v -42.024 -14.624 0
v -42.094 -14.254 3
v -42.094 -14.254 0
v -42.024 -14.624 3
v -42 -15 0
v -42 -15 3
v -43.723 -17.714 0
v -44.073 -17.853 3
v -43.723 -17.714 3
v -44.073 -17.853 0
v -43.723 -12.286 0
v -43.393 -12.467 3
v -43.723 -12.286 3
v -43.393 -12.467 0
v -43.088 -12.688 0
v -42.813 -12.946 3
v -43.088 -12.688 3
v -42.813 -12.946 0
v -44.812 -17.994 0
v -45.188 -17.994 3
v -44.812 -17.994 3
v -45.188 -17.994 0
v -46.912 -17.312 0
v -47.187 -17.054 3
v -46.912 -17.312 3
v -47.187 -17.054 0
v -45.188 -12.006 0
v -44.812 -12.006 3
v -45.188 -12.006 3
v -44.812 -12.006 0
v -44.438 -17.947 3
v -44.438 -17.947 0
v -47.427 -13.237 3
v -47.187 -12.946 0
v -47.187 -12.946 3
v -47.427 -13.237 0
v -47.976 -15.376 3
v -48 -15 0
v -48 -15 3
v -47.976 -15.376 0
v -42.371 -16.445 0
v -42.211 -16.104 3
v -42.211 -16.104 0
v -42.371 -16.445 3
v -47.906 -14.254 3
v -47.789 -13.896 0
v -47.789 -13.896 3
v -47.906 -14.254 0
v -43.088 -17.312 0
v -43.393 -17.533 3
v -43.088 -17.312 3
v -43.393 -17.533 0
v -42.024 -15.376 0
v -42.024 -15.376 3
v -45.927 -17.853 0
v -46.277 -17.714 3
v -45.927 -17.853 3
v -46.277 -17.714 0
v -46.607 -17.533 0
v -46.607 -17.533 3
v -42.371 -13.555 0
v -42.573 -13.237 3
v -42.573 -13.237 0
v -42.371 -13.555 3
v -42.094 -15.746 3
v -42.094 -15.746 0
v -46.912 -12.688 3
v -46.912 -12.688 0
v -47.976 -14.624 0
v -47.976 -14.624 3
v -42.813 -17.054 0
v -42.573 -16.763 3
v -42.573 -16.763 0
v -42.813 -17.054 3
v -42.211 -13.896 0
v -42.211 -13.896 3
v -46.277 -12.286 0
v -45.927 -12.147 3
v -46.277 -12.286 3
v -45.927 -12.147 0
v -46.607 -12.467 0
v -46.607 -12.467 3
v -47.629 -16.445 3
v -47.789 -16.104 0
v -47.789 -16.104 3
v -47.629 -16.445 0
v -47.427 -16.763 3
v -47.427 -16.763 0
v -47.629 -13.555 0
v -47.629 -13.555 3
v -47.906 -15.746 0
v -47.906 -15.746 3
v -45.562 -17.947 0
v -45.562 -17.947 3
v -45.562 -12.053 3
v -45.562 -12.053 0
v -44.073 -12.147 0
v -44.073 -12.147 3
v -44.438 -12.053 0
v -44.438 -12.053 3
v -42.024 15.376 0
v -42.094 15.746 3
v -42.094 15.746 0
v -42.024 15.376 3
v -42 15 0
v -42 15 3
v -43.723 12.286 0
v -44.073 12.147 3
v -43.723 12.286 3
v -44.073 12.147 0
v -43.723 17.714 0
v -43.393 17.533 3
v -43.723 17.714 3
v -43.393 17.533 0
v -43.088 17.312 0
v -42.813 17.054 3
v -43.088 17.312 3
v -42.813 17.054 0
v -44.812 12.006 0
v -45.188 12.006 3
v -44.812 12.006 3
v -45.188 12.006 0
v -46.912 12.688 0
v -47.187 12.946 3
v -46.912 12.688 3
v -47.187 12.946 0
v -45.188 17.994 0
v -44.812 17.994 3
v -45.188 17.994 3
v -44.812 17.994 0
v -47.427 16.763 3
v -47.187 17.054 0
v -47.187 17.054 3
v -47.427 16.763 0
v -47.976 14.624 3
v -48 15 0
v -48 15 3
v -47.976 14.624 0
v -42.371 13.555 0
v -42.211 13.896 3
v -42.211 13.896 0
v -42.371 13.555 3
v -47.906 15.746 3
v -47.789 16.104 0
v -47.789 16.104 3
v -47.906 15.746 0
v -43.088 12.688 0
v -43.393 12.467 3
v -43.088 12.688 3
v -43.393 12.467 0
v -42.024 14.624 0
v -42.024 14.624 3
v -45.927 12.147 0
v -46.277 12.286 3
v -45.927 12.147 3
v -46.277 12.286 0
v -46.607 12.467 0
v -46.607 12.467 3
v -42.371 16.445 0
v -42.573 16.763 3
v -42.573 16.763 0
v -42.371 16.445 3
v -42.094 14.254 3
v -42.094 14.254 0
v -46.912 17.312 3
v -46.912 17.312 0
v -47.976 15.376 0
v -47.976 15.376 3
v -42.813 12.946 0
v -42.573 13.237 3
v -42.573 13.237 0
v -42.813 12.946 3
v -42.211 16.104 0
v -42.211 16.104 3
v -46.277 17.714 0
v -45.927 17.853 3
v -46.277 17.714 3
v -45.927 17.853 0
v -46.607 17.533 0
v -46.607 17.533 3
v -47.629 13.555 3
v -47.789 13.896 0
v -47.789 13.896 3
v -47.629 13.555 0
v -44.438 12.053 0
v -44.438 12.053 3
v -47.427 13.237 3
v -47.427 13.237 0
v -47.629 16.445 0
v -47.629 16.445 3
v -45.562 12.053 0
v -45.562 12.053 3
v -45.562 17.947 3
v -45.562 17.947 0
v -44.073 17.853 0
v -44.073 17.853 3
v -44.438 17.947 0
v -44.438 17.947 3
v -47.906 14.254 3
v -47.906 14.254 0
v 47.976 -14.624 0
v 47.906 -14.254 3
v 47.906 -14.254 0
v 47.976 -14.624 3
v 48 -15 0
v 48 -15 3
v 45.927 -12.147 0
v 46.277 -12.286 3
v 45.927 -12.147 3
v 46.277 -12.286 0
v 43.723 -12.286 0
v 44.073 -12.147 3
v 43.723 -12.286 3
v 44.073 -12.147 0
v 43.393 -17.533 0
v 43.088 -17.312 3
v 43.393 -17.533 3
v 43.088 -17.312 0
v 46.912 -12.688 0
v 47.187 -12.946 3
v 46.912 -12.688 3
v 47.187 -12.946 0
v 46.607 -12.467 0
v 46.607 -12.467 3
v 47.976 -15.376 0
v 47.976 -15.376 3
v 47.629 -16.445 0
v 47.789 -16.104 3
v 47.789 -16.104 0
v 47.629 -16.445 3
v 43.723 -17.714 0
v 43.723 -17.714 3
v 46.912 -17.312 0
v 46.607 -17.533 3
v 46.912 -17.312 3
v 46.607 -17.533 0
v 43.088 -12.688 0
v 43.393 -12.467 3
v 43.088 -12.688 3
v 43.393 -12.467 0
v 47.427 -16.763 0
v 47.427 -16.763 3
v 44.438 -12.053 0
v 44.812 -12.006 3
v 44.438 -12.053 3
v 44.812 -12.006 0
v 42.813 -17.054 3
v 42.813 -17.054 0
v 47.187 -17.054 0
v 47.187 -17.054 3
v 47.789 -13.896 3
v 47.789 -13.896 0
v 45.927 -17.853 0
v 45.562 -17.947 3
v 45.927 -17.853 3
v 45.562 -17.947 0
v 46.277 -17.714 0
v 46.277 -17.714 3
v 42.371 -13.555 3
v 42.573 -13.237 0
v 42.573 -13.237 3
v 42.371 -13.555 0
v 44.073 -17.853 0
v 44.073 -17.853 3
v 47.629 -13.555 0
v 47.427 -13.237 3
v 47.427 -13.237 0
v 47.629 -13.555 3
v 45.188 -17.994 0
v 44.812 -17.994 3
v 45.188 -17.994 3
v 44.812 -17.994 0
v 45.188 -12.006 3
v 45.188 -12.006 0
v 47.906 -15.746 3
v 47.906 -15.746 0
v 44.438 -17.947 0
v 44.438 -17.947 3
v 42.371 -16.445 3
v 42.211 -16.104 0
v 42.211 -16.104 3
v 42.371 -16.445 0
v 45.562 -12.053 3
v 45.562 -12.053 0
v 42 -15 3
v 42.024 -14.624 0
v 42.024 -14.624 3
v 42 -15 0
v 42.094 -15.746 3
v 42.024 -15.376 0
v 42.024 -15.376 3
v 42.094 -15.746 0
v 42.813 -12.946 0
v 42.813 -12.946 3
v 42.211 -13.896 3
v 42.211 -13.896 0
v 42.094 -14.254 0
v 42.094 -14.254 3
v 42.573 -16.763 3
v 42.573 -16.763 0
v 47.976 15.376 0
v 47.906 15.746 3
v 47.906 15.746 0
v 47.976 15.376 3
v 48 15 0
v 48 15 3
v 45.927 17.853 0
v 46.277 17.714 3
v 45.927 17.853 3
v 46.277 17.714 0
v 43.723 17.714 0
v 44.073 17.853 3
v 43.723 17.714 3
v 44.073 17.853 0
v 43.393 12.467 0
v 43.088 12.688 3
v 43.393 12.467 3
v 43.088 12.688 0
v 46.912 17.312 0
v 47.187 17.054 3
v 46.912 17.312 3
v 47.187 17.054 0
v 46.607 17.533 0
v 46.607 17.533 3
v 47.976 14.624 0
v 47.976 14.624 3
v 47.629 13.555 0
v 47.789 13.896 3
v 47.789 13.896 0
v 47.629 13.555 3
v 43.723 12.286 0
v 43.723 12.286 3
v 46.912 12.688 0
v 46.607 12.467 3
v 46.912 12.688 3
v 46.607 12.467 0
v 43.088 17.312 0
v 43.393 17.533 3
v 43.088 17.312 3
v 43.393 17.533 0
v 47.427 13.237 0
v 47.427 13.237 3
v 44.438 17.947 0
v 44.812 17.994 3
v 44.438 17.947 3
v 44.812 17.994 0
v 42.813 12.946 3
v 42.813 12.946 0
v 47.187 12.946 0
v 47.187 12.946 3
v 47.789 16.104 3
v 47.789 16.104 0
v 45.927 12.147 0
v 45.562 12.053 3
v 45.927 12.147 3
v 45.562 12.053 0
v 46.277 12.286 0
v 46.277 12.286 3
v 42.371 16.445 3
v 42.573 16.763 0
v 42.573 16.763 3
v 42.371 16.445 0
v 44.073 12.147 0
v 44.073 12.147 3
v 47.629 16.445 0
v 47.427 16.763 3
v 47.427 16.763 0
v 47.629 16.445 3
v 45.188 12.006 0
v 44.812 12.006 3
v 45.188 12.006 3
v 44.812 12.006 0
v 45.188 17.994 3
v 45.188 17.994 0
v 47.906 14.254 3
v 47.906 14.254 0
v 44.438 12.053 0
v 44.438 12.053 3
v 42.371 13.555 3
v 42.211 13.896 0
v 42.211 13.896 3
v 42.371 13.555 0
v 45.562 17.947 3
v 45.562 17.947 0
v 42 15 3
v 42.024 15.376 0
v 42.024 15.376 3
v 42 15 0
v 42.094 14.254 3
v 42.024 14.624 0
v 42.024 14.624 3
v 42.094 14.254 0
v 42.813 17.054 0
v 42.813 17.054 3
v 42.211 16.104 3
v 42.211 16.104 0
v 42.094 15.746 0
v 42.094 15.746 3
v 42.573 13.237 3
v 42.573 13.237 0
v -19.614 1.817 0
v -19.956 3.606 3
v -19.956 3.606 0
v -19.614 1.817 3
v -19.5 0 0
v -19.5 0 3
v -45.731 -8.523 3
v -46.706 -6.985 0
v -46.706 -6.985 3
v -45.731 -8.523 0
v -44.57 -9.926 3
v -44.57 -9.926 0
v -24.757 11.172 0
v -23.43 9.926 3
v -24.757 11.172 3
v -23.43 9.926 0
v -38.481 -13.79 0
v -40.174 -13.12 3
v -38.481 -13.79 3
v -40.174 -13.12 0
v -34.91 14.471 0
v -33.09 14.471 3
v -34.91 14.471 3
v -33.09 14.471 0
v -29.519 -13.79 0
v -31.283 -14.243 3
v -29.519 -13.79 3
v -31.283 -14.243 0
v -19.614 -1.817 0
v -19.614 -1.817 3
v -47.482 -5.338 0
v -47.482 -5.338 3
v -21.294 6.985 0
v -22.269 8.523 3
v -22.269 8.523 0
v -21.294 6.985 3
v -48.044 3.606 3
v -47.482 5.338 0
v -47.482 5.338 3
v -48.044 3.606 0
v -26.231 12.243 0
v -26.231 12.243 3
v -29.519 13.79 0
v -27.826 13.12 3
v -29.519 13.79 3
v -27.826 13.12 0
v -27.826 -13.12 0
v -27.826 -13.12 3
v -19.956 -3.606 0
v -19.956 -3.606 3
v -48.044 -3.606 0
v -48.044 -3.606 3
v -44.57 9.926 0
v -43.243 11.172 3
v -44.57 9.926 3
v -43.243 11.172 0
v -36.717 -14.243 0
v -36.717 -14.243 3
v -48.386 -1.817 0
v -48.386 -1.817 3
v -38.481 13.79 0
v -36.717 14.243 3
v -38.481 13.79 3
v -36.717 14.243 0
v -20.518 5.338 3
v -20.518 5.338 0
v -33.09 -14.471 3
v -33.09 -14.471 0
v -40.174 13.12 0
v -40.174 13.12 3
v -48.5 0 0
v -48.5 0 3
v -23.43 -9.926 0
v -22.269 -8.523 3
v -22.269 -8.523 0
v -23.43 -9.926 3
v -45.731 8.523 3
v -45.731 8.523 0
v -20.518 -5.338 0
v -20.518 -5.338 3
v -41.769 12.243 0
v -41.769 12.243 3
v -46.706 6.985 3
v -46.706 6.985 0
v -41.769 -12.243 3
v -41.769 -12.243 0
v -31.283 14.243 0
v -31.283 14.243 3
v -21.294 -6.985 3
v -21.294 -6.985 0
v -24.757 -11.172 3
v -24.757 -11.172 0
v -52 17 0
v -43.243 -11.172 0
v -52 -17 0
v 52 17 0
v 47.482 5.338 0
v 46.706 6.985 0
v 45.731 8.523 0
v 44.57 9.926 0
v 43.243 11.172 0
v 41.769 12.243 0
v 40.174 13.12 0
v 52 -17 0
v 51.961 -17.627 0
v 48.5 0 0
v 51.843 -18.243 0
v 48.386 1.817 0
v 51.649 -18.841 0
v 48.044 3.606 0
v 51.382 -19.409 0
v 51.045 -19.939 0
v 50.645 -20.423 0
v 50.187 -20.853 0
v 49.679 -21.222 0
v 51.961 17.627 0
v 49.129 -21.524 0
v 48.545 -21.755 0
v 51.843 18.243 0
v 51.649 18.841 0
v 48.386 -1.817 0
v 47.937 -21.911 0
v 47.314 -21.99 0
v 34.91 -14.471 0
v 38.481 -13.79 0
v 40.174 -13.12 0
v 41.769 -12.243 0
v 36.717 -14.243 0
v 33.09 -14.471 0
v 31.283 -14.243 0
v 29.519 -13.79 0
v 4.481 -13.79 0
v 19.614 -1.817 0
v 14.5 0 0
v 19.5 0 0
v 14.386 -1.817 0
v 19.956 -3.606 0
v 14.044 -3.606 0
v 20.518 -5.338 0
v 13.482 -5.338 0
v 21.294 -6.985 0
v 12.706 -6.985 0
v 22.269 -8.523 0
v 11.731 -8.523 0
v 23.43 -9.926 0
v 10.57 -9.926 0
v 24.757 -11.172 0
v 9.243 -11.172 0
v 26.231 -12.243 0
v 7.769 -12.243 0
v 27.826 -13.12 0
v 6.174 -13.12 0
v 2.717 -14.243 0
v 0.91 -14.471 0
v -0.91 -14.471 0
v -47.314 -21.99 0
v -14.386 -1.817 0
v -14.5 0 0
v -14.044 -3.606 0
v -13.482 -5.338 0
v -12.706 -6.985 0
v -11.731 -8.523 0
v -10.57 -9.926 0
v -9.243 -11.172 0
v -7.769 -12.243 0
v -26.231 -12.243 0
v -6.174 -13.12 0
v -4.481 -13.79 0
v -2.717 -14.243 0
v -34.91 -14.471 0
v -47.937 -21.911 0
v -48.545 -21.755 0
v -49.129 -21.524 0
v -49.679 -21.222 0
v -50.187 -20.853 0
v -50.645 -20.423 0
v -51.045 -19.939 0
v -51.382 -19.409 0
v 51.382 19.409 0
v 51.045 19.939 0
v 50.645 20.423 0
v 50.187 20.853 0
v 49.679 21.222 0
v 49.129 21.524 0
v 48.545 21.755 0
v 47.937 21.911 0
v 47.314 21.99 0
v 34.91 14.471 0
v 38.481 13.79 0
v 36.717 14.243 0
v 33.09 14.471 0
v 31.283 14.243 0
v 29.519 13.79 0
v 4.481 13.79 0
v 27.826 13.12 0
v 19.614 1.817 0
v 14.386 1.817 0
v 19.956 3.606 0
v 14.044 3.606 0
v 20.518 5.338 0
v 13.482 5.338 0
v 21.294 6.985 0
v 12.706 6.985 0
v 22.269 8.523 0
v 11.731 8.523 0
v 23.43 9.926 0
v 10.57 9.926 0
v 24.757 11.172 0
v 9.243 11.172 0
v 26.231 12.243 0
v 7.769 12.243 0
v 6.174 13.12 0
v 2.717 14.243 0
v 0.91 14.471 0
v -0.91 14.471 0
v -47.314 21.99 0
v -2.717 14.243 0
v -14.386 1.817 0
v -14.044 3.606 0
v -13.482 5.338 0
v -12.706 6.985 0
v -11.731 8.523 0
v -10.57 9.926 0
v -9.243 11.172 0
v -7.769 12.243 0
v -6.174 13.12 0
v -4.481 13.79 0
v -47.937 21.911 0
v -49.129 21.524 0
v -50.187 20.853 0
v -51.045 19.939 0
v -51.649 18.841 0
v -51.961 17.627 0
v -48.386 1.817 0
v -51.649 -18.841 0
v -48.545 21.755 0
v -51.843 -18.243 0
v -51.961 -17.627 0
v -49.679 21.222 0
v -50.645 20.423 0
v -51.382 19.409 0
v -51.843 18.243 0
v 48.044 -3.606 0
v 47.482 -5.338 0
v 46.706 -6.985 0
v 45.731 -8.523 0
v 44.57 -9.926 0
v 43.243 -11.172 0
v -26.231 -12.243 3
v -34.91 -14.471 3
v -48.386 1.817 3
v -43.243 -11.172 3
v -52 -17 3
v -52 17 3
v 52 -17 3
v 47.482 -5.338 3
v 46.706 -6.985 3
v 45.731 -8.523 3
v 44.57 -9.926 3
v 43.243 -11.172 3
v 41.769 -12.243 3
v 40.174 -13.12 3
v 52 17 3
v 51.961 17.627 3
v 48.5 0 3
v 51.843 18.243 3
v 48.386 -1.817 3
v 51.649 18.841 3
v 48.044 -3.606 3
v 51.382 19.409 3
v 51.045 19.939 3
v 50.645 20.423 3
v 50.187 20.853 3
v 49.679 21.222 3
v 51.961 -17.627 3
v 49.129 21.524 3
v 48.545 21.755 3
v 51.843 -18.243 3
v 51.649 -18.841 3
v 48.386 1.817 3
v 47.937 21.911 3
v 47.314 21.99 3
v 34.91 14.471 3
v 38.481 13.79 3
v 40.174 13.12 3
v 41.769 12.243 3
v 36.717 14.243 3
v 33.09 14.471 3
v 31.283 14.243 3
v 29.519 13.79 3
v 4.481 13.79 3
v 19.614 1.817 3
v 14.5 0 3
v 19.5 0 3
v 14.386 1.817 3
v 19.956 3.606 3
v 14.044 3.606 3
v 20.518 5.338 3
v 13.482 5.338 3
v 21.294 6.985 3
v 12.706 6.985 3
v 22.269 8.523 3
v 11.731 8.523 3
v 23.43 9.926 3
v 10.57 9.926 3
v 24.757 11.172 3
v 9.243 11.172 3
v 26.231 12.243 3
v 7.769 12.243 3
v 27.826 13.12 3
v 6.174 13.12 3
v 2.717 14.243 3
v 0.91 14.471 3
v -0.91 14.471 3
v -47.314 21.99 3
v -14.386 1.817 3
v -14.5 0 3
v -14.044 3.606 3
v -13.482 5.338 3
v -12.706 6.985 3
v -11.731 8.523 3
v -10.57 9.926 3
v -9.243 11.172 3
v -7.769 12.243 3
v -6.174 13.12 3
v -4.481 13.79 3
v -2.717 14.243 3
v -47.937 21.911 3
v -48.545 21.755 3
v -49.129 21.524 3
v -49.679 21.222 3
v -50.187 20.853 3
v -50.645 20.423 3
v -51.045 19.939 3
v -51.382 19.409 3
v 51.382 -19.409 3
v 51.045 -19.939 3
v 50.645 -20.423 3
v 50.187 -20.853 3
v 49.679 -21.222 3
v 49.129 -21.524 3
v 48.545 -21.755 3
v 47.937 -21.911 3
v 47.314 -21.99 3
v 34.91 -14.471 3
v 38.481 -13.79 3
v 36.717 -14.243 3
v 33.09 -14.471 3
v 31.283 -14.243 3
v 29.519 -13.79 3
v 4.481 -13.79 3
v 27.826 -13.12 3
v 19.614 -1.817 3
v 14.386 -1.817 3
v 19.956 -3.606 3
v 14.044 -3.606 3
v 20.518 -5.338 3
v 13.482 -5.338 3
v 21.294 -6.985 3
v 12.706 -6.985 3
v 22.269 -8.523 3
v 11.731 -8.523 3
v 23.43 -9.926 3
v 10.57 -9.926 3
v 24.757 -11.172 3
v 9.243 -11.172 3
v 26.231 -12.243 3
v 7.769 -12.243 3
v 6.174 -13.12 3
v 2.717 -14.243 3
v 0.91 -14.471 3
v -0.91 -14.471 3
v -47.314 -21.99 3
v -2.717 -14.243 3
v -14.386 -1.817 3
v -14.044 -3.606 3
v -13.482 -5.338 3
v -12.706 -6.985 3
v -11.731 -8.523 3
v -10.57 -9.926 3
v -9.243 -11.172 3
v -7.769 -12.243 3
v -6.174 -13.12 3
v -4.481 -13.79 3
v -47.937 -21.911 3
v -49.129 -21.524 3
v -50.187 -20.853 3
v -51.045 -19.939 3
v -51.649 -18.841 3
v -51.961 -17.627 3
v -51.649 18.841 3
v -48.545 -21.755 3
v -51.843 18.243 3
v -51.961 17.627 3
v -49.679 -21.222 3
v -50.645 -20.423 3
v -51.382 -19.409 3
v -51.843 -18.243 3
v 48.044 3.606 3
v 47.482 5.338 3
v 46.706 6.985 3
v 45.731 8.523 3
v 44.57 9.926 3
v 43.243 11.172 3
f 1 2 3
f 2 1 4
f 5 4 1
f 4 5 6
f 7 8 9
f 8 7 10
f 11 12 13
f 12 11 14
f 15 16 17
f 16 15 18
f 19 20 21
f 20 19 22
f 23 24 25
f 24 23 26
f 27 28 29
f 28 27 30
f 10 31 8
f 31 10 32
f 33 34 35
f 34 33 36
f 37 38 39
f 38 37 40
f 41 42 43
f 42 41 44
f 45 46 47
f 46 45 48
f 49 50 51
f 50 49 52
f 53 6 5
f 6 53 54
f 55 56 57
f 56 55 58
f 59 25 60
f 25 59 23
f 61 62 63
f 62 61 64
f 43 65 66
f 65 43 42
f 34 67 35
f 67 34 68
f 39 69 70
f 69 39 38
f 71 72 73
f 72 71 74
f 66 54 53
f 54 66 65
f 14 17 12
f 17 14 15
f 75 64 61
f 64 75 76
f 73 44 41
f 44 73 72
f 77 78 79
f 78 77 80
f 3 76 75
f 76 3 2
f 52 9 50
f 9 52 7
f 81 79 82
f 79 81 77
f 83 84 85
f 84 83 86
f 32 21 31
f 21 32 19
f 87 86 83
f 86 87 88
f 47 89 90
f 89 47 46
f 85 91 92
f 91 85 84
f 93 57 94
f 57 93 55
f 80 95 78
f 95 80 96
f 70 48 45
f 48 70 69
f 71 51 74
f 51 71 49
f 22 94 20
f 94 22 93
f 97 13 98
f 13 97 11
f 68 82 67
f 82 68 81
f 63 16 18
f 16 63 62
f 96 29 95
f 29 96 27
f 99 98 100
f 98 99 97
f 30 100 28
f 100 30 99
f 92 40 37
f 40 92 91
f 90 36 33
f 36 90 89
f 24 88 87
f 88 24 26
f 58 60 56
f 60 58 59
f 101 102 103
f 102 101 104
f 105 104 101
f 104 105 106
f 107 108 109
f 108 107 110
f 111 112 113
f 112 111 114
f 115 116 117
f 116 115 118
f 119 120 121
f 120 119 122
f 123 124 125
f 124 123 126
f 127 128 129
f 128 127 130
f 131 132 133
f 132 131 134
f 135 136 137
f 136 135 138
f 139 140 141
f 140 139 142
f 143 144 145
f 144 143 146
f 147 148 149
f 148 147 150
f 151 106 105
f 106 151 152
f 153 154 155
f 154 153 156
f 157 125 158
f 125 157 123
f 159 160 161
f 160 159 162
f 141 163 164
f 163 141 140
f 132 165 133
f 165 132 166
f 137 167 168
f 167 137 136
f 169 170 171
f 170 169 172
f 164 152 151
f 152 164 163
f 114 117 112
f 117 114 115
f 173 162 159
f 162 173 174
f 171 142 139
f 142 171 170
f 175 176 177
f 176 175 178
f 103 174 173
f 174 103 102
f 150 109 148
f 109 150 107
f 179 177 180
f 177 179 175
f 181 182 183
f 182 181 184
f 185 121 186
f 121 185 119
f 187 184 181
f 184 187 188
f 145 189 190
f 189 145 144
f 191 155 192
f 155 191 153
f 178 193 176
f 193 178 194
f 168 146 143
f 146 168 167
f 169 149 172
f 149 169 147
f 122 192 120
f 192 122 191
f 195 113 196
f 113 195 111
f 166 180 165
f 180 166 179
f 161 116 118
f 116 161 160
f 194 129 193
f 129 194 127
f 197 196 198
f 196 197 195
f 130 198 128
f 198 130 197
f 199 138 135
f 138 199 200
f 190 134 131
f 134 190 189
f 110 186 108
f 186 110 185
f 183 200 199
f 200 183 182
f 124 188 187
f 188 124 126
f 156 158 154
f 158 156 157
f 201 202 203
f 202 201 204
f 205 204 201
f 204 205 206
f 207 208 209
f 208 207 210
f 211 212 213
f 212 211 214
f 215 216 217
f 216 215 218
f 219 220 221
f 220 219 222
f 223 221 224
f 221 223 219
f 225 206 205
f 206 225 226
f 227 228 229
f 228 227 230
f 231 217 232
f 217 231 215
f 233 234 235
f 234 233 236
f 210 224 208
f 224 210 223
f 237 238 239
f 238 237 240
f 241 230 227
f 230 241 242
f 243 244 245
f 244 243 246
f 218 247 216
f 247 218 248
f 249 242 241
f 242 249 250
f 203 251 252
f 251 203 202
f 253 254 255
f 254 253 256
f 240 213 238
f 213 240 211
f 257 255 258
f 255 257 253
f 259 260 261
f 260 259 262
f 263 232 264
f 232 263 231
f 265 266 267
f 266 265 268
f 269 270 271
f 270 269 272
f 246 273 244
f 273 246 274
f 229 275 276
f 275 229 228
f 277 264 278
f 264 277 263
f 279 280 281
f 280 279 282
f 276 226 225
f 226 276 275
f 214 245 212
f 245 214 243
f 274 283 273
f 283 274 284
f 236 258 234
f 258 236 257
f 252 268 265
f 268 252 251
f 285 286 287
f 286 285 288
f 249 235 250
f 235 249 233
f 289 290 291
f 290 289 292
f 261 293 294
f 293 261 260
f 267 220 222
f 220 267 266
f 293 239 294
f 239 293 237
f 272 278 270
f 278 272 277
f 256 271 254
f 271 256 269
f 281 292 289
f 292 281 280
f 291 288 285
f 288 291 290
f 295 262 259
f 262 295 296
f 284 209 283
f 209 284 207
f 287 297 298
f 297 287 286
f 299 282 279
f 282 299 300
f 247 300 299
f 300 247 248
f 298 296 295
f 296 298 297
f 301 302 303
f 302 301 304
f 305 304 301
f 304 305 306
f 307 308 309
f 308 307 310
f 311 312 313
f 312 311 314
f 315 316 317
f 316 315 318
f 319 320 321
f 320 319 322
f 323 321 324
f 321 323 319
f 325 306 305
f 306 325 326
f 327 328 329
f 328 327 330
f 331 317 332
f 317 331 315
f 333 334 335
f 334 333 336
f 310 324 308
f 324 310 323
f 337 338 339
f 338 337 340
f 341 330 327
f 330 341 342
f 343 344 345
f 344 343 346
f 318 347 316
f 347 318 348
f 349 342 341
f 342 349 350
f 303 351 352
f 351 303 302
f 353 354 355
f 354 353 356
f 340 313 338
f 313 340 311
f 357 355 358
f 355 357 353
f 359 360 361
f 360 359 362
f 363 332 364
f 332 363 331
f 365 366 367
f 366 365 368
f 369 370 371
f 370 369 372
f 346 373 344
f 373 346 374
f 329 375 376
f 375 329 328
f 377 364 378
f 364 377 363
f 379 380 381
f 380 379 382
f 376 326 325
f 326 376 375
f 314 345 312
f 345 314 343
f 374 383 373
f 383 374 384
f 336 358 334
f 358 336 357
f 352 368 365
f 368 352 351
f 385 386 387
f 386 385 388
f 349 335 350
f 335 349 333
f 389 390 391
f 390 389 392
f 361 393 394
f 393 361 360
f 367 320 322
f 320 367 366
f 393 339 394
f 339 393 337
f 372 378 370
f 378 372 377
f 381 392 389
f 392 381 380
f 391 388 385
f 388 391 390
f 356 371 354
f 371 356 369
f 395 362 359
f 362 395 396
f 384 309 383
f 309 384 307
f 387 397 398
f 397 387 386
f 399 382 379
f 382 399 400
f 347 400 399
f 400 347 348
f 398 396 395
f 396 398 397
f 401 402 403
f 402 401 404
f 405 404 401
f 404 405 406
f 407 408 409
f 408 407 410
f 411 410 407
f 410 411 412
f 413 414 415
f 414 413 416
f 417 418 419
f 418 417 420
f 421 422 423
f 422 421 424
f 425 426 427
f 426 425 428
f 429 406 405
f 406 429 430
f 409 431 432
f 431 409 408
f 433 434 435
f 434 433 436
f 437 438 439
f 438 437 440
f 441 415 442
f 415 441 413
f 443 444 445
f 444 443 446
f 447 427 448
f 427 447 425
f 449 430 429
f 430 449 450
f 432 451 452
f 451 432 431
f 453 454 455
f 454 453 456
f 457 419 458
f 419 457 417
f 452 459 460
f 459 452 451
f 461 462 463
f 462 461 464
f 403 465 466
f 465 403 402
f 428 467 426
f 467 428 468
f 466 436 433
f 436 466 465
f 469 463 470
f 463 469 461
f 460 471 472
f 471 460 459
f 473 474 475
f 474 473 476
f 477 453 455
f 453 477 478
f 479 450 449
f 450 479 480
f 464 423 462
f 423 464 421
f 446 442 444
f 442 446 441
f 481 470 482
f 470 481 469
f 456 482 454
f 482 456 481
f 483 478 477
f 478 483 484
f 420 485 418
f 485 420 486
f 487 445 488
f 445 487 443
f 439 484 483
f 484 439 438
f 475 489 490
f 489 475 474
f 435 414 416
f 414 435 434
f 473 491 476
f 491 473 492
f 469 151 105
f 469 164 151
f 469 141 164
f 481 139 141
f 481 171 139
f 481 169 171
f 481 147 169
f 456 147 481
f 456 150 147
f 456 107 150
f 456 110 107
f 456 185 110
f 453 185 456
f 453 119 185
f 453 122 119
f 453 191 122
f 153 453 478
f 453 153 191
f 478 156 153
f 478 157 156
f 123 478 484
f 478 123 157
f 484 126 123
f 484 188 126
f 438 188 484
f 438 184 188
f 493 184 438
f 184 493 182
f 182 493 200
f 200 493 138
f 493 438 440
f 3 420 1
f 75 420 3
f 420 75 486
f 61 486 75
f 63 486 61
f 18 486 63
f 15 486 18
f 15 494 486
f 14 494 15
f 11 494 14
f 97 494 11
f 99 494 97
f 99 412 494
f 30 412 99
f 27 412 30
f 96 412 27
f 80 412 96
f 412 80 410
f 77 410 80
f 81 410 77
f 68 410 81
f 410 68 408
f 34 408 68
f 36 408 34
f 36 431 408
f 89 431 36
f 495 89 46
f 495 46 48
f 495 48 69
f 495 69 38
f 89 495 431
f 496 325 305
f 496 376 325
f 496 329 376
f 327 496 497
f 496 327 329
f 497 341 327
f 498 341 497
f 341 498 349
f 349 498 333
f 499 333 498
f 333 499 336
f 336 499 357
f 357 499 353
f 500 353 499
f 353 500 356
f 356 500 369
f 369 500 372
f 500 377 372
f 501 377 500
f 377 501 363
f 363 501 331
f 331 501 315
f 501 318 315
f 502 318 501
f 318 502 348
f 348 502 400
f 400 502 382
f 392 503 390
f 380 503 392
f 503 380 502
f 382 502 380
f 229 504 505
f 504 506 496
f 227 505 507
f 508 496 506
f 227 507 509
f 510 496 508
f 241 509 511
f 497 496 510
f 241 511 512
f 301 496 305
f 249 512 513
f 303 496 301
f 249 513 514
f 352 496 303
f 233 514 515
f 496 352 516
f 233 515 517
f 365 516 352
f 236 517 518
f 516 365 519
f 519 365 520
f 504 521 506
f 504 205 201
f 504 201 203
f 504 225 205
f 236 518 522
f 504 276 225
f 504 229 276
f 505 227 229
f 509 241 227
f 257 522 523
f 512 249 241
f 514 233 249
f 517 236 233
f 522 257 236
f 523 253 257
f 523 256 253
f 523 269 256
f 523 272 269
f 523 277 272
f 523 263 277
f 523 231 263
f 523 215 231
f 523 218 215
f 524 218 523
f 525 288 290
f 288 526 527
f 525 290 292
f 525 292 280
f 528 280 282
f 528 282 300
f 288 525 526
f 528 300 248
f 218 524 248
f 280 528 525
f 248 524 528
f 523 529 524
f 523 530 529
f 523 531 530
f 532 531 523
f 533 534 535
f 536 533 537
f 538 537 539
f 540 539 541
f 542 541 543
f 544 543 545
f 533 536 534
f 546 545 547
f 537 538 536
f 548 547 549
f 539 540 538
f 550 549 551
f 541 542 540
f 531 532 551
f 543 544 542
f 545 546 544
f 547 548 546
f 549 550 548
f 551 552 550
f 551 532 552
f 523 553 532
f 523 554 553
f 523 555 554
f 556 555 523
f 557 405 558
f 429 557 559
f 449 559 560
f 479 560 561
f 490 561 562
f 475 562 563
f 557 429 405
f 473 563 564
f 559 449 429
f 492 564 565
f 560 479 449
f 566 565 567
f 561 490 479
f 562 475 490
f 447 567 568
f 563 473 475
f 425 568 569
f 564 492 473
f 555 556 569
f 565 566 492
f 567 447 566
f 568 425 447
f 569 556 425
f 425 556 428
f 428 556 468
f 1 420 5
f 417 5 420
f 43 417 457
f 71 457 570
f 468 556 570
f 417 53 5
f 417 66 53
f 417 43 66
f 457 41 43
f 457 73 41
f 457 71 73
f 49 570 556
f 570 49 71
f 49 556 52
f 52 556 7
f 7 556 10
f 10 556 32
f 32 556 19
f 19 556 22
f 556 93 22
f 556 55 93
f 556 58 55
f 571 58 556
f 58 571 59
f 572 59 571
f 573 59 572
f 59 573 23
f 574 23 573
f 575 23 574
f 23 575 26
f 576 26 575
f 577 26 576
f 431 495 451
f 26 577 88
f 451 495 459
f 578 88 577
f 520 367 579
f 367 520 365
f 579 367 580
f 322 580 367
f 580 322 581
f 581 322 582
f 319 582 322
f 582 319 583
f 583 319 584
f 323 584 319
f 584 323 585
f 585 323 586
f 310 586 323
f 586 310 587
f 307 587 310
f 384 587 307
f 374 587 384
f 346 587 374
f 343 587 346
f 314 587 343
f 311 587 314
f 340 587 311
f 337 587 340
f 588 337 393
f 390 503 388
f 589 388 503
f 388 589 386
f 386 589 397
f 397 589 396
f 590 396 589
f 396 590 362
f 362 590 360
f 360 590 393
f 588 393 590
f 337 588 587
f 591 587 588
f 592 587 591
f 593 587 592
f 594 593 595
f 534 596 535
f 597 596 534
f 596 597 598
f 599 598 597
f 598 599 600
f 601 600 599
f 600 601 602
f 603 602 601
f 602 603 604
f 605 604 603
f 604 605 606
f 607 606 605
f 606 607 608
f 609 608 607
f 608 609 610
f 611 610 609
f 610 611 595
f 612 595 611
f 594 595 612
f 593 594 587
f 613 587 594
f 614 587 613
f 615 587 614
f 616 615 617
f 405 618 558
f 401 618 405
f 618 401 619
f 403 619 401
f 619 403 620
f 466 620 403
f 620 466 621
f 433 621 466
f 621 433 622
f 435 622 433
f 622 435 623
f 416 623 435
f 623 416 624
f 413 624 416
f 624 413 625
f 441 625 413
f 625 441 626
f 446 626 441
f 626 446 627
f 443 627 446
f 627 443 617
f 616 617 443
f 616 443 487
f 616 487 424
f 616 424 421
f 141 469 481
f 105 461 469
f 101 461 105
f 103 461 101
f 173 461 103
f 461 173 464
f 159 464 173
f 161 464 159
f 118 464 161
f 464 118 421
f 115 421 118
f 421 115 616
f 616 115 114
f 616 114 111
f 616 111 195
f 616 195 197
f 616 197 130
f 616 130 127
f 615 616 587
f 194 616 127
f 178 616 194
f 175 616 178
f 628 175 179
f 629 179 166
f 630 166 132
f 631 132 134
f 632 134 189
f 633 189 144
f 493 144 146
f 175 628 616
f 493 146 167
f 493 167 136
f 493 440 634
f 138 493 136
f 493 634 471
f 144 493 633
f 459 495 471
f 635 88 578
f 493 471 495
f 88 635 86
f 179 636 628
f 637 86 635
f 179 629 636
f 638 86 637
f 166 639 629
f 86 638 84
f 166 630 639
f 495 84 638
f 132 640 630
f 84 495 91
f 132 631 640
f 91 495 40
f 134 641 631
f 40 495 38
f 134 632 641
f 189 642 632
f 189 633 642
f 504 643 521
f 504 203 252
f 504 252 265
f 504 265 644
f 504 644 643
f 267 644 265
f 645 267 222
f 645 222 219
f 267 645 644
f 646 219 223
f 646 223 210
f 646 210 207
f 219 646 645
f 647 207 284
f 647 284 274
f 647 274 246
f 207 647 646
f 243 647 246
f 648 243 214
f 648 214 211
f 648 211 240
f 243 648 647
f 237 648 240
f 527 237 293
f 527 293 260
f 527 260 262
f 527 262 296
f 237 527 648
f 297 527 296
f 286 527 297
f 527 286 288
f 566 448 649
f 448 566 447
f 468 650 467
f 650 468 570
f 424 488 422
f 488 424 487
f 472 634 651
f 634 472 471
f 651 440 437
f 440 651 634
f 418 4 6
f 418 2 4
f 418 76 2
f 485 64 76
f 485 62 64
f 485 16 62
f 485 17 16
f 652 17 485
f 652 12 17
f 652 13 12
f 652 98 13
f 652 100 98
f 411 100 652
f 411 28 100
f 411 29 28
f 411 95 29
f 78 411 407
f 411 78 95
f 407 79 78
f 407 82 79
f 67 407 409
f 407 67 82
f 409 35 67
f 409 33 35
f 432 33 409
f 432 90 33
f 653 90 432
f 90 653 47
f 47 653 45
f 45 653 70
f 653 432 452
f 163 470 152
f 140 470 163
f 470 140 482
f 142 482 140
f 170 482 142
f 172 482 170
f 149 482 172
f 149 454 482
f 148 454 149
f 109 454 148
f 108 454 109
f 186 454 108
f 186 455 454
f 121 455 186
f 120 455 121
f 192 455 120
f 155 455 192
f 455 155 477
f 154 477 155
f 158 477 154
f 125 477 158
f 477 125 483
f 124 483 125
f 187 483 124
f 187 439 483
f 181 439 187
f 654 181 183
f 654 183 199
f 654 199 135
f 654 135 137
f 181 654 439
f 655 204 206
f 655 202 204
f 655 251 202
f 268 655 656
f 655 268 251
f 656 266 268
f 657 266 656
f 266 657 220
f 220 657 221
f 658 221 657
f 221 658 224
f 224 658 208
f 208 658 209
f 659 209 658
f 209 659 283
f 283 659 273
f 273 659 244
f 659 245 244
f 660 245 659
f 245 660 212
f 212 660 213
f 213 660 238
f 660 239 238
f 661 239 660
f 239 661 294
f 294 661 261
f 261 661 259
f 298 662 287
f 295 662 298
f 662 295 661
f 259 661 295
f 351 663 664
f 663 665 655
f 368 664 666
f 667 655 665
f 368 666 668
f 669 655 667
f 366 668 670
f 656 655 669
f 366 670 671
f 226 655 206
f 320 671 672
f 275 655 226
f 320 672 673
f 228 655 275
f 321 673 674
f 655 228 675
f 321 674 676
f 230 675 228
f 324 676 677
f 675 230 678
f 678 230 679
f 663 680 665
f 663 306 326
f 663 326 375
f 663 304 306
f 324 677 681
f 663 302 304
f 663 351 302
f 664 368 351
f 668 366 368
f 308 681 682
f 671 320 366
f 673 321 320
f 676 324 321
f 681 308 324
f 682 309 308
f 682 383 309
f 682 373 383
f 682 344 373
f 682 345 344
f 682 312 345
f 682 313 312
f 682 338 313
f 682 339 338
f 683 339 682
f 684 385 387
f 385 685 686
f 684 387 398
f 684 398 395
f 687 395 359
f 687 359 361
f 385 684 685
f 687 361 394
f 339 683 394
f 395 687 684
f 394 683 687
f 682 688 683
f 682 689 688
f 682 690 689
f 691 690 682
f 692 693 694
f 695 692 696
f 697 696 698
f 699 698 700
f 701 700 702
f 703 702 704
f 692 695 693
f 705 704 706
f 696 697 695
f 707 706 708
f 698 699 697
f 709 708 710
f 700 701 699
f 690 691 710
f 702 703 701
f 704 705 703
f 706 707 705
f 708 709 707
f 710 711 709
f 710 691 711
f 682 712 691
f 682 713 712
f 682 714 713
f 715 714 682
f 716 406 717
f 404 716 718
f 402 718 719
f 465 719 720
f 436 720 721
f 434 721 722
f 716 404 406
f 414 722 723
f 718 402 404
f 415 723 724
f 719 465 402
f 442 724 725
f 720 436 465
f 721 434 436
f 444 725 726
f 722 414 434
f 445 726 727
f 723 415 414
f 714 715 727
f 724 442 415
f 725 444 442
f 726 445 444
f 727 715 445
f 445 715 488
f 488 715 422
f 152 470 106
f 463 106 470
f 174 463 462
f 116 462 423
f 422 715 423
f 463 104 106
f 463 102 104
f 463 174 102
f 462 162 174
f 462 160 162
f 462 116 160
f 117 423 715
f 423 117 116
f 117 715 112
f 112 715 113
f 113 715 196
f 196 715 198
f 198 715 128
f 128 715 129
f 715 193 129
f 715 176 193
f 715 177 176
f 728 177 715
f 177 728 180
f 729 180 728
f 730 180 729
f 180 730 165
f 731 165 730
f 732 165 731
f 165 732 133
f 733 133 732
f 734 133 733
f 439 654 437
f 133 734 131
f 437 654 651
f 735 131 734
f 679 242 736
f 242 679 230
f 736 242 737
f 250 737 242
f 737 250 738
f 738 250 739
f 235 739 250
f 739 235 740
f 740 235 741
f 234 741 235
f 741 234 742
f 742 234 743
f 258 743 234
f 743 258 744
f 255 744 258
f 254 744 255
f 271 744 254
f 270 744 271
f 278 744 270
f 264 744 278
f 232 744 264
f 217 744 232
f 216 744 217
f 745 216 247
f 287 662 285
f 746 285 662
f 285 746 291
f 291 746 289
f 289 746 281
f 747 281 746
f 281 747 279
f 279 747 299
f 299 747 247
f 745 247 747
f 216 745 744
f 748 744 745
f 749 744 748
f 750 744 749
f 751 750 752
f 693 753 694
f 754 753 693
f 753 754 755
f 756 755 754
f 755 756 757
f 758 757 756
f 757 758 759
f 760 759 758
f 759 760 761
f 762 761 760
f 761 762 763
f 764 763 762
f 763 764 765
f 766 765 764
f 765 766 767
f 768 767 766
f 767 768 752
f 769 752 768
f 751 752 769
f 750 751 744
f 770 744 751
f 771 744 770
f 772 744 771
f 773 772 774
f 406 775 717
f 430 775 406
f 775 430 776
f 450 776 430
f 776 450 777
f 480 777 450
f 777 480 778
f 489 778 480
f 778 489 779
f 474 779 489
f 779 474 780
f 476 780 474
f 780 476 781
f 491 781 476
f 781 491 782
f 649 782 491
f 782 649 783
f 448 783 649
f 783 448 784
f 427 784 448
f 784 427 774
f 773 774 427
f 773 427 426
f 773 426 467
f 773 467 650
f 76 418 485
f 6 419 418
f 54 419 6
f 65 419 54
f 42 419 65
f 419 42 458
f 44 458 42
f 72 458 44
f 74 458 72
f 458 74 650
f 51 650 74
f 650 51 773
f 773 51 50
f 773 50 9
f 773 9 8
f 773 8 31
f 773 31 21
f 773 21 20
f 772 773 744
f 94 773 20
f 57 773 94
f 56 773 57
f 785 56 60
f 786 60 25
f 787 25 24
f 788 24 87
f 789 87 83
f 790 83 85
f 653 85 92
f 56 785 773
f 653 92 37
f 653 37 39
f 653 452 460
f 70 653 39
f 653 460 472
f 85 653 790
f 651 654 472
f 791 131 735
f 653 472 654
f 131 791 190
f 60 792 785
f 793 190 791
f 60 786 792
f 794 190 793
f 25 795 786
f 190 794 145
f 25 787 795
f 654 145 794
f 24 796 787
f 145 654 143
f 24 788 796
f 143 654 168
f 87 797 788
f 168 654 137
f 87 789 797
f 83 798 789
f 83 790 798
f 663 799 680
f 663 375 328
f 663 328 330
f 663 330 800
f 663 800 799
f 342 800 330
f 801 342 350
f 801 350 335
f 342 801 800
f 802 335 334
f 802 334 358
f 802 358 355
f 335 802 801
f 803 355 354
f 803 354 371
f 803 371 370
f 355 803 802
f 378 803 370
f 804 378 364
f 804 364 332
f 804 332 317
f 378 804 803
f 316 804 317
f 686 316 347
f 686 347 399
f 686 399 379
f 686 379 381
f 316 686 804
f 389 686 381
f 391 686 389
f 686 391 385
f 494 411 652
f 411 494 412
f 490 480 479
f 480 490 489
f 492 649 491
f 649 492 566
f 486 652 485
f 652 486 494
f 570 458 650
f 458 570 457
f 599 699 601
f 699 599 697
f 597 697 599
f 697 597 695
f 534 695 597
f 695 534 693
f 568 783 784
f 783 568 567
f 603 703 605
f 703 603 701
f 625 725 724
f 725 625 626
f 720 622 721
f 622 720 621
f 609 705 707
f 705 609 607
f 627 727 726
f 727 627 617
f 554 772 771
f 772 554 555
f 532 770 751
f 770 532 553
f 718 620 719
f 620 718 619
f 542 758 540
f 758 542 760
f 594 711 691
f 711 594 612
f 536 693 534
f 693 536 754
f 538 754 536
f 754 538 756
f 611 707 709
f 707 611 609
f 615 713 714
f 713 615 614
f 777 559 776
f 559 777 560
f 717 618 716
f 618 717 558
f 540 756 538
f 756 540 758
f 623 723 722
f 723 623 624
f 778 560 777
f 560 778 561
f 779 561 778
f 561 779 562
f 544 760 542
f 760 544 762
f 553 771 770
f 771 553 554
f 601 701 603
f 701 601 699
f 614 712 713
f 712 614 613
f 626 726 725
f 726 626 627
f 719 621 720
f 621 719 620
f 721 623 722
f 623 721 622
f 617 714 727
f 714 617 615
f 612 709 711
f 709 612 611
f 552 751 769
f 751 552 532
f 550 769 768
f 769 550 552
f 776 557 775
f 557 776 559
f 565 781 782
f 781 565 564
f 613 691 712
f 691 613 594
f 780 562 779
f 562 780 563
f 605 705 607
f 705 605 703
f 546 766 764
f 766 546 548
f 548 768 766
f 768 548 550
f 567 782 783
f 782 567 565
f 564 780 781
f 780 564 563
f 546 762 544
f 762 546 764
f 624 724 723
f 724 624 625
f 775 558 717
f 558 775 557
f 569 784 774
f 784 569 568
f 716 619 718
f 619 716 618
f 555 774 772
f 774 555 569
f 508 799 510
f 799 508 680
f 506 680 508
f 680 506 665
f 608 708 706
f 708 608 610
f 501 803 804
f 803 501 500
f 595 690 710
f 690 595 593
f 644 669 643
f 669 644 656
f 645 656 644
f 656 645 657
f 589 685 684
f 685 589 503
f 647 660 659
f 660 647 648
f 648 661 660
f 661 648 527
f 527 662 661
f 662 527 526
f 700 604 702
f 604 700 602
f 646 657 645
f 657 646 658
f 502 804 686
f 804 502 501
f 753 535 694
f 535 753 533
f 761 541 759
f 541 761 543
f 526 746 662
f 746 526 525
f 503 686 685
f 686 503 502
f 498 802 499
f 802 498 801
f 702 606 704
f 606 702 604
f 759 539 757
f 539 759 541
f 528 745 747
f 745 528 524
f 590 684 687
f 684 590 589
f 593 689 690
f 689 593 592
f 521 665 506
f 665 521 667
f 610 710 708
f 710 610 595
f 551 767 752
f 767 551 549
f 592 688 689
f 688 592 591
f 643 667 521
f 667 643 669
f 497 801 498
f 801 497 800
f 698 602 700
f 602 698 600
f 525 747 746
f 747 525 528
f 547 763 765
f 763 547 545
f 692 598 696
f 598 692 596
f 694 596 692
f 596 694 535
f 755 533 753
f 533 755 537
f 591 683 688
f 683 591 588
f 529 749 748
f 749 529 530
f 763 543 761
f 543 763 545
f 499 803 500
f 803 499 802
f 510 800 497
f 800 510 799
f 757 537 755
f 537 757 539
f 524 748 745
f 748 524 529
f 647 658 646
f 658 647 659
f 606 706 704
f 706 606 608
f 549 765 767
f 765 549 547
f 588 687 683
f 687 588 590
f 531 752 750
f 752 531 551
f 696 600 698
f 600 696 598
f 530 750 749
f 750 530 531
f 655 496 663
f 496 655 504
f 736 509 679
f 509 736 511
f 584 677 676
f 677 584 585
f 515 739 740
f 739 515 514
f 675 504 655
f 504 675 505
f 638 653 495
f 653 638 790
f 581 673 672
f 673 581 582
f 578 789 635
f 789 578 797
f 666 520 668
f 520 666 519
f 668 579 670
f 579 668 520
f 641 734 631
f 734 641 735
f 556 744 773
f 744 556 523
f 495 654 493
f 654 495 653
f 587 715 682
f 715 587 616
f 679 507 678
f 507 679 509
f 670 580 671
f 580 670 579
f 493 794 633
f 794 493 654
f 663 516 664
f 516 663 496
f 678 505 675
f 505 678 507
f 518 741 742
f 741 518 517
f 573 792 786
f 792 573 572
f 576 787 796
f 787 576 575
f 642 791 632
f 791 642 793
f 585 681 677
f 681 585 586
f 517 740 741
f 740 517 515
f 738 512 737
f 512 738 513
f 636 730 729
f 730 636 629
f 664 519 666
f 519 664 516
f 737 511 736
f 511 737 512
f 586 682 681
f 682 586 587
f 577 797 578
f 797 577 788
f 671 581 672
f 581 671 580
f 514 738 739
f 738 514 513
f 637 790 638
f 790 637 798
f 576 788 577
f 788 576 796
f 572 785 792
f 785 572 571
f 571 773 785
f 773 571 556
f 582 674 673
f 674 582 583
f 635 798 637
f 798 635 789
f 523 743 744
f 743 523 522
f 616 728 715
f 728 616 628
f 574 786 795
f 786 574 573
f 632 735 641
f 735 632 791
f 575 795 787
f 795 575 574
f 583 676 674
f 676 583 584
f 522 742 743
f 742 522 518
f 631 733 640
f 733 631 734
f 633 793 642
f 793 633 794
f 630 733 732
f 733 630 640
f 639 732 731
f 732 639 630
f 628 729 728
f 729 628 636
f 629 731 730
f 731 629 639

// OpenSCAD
$fn = 50;


difference() {
	union() {
		hull() {
			translate(v = [-47.0000000000, 17.0000000000, 0]) {
				cylinder(h = 3, r = 5);
			}
			translate(v = [47.0000000000, 17.0000000000, 0]) {
				cylinder(h = 3, r = 5);
			}
			translate(v = [-47.0000000000, -17.0000000000, 0]) {
				cylinder(h = 3, r = 5);
			}
			translate(v = [47.0000000000, -17.0000000000, 0]) {
				cylinder(h = 3, r = 5);
			}
		}
	}
	union() {
		#translate(v = [-45.0000000000, -15.0000000000, -100.0000000000]) {
			cylinder(h = 200, r = 3.0000000000);
		}
		#translate(v = [-45.0000000000, 15.0000000000, -100.0000000000]) {
			cylinder(h = 200, r = 3.0000000000);
		}
		#translate(v = [45.0000000000, -15.0000000000, -100.0000000000]) {
			cylinder(h = 200, r = 3.0000000000);
		}
		#translate(v = [45.0000000000, 15.0000000000, -100.0000000000]) {
			cylinder(h = 200, r = 3.0000000000);
		}
		#translate(v = [-34.0000000000, 0, 0]) {
			cylinder(h = 3, r = 14.5000000000);
		}
		#cylinder(h = 3, r = 14.5000000000);
		#translate(v = [34.0000000000, 0, 0]) {
			cylinder(h = 3, r = 14.5000000000);
		}
	}
}
